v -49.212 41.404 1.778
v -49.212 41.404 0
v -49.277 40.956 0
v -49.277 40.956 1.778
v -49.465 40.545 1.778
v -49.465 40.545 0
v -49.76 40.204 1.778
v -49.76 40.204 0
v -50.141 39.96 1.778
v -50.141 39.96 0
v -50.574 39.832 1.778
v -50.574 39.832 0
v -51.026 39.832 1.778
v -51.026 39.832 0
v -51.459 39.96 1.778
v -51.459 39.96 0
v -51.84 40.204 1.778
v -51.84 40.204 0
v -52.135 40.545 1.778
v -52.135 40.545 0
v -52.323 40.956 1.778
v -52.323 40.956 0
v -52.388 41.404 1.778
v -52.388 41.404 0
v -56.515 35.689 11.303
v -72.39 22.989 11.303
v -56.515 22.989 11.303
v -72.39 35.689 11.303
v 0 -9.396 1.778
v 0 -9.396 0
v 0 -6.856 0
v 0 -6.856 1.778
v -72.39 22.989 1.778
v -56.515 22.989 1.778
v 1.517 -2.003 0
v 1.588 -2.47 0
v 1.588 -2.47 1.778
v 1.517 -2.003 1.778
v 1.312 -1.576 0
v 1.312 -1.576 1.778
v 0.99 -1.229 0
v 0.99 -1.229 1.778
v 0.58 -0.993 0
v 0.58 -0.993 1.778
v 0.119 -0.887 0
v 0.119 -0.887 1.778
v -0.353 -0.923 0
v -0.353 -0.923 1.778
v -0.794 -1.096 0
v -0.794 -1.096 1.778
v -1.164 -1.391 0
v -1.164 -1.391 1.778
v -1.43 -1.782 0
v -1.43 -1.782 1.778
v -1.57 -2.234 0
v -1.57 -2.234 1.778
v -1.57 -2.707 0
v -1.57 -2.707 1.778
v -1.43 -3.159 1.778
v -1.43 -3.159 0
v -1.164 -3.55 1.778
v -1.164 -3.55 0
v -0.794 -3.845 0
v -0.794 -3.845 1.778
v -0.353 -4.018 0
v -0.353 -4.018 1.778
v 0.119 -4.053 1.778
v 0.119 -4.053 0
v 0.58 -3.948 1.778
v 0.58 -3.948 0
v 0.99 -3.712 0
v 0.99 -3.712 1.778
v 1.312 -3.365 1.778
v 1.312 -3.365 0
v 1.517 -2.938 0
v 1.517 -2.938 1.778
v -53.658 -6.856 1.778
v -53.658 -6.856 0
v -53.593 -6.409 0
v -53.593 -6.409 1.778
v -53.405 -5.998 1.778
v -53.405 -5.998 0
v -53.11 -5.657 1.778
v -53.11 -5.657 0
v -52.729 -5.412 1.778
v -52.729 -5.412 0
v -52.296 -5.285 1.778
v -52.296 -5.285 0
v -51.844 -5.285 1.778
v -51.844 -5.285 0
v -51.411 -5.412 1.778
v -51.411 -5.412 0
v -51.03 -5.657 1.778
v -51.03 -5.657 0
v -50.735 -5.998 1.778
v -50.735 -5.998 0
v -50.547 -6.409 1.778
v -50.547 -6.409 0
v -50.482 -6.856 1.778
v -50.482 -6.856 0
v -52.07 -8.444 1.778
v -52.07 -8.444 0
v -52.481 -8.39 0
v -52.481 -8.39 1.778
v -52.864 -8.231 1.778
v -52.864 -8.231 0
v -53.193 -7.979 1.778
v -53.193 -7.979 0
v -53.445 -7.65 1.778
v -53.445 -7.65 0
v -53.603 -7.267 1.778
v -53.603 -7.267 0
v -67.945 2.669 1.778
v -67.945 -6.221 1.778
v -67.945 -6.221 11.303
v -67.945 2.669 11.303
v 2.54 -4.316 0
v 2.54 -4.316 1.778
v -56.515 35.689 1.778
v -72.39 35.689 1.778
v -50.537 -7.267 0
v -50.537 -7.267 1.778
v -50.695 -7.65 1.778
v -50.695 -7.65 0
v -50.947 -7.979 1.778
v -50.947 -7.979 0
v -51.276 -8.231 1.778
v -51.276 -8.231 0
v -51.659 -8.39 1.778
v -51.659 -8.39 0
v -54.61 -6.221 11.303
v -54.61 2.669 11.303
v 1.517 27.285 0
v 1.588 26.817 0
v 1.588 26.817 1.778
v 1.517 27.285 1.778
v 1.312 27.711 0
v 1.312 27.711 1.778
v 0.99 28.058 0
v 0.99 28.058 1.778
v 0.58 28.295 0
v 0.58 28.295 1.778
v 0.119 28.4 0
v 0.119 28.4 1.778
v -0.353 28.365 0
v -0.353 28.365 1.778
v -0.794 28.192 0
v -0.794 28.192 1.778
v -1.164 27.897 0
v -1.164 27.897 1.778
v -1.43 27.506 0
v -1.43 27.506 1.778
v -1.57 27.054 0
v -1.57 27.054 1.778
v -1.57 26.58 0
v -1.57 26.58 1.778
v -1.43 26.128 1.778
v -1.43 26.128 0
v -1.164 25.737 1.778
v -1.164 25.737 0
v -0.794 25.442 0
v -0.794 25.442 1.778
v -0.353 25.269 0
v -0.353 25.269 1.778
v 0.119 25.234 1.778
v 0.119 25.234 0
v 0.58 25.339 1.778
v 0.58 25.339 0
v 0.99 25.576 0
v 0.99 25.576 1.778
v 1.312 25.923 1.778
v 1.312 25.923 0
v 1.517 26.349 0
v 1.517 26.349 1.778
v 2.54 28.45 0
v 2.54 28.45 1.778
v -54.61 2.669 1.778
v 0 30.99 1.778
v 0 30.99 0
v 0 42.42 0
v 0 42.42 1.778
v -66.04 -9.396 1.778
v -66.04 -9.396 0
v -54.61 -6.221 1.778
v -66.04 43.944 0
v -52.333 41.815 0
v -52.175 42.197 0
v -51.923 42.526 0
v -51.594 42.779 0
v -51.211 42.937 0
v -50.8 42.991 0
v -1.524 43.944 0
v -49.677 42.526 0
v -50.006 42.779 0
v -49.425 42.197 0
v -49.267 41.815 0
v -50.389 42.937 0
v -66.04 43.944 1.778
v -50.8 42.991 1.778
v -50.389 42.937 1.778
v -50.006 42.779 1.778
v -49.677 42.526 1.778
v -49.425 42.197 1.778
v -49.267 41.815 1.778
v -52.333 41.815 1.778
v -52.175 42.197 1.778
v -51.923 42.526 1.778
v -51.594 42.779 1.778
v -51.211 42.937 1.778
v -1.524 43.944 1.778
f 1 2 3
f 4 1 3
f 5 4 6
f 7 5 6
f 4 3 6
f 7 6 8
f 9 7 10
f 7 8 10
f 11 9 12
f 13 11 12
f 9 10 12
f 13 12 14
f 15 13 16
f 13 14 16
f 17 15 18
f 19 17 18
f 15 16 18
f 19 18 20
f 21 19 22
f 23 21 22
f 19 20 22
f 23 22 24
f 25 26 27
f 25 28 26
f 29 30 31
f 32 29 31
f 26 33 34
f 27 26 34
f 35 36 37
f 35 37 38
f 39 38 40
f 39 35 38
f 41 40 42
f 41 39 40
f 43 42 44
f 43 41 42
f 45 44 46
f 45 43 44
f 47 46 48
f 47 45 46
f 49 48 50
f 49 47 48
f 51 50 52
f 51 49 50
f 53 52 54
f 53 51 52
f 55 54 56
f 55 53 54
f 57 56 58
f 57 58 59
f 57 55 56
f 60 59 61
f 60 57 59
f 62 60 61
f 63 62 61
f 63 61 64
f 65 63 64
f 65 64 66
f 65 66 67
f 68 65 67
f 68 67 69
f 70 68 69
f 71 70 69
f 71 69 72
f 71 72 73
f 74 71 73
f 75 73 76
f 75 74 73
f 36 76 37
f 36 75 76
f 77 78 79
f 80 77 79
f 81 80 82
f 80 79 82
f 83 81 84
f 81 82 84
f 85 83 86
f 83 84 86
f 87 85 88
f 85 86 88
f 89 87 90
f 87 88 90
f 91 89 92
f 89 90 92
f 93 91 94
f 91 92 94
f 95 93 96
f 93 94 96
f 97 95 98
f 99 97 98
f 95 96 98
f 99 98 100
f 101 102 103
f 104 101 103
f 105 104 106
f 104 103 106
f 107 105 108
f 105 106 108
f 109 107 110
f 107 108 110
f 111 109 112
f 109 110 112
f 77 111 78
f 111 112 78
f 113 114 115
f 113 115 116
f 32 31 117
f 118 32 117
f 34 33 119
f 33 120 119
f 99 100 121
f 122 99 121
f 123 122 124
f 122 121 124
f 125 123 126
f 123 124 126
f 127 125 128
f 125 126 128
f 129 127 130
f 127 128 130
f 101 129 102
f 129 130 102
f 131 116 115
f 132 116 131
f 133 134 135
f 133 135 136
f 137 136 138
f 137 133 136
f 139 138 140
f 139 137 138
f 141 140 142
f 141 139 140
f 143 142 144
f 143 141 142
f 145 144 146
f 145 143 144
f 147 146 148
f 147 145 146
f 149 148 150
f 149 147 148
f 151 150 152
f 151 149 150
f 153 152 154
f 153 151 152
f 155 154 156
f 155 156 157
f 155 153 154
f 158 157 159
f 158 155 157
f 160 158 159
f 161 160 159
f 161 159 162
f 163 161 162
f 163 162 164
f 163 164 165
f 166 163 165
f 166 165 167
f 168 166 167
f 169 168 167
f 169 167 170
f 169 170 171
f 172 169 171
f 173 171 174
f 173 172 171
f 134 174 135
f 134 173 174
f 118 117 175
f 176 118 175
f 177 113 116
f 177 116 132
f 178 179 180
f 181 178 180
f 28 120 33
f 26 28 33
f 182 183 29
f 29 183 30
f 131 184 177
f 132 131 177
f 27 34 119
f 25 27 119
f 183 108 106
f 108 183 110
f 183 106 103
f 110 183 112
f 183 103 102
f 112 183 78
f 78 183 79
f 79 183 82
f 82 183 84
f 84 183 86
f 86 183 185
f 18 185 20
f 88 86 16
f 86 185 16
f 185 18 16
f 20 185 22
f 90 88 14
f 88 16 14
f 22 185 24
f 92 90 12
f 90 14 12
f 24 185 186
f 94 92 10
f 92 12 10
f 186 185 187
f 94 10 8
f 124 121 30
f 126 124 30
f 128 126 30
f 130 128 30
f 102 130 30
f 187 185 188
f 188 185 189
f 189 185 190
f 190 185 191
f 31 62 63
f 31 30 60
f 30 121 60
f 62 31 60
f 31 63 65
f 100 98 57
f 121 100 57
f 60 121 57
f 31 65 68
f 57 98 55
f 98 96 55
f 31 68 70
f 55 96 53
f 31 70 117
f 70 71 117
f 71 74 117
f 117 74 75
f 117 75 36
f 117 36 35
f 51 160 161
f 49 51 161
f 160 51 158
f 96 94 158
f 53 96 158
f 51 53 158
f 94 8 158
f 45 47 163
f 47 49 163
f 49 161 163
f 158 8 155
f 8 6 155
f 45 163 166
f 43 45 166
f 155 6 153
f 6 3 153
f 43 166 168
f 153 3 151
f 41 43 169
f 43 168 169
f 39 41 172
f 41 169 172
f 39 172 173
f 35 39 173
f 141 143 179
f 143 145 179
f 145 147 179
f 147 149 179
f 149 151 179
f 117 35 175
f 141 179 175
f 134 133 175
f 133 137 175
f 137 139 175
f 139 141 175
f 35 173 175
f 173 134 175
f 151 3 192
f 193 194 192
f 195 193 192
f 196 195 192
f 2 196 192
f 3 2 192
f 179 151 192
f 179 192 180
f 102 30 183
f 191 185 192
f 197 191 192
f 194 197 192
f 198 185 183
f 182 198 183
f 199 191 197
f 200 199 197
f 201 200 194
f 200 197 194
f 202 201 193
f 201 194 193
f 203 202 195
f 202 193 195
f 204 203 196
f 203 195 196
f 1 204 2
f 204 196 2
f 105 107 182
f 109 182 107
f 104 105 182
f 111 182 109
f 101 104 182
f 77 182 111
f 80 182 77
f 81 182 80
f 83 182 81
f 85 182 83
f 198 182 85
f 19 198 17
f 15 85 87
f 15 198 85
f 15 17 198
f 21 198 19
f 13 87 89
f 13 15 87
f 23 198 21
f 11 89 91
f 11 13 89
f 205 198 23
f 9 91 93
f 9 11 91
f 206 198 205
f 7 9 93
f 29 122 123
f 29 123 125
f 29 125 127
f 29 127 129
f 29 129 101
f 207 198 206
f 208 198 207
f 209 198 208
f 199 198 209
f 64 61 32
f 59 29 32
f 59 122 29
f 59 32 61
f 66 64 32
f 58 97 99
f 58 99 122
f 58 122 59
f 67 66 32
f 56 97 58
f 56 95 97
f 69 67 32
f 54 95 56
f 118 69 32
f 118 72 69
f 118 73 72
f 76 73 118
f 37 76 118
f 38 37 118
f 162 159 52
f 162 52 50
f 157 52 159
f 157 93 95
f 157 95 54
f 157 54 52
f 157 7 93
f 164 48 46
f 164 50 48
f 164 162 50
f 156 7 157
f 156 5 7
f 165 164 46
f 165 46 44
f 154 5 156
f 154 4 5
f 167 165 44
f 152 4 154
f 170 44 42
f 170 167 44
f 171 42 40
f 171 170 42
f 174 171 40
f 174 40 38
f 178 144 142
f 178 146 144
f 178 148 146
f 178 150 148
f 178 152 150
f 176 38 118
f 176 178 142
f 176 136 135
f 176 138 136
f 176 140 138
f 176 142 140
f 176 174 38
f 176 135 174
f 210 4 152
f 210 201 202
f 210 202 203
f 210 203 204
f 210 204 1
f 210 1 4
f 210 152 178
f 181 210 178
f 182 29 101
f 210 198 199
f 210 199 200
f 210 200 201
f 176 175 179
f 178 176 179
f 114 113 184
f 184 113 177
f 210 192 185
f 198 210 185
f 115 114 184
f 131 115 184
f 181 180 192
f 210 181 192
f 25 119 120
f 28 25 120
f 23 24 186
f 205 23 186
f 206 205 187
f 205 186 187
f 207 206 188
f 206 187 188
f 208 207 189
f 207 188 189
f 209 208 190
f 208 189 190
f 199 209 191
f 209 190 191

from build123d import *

# Parameters (mm, degrees)
F0_R     = 1.5875
F1_DEPTH = 1.778
F2_W     = 13.335
F2_H     = 8.89
F3_DEPTH = 9.525


with BuildPart() as f1:
    # F0 (on Top) → F1 (new body)
    with BuildSketch(Plane.XY):
        with BuildLine():
            Line((-50.8, 43.943732), (-66.04, 43.943732))
            Line((-66.04, 43.943732), (-66.04, 41.403732))
            Line((-66.04, 41.403732), (-52.3875, 41.403732))
            ThreePointArc((-52.3875, 41.403732), (-51.922532, 42.526264), (-50.8, 42.991232))
            Line((-50.8, 42.991232), (-50.8, 43.943732))
        make_face()
        with BuildLine():
            Line((-52.3875, 41.403732), (-66.04, 41.403732))
            Line((-66.04, 41.403732), (-66.04, -6.856268))
            Line((-66.04, -6.856268), (-53.6575, -6.856268))
            ThreePointArc((-53.6575, -6.856268), (-52.07, -5.268768), (-50.4825, -6.856268))
            ThreePointArc((-50.4825, -6.856268), (-50.947468, -7.9788), (-52.07, -8.443768))
            Line((-52.07, -8.443768), (-52.07, -9.396268))
            Line((-52.07, -9.396268), (0, -9.396268))
            Line((0, -9.396268), (0, -6.856268))
            Line((0, -6.856268), (2.54, -4.316268))
            Line((2.54, -4.316268), (2.54, 28.449732))
            Line((2.54, 28.449732), (0, 30.989732))
            Line((0, 30.989732), (0, 42.419732))
            Line((0, 42.419732), (-1.524, 43.943732))
            Line((-1.524, 43.943732), (-50.8, 43.943732))
            Line((-50.8, 43.943732), (-50.8, 42.991232))
            ThreePointArc((-50.8, 42.991232), (-49.677468, 42.526264), (-49.2125, 41.403732))
            ThreePointArc((-49.2125, 41.403732), (-50.8, 39.816232), (-52.3875, 41.403732))
        make_face()
        with Locations((0, -2.470437)):
            Circle(F0_R, mode=Mode.SUBTRACT)
        with Locations((0, 26.817046)):
            Circle(F0_R, mode=Mode.SUBTRACT)
        with BuildLine():
            Line((-53.6575, -6.856268), (-66.04, -6.856268))
            Line((-66.04, -6.856268), (-66.04, -9.396268))
            Line((-66.04, -9.396268), (-52.07, -9.396268))
            Line((-52.07, -9.396268), (-52.07, -8.443768))
            ThreePointArc((-52.07, -8.443768), (-53.192532, -7.9788), (-53.6575, -6.856268))
        make_face()
    extrude(amount=F1_DEPTH)


with BuildPart() as f3:
    # F2 (on face) → F3 (new body)
    with BuildSketch(Plane.XY.offset(1.778)):
        with Locations((-61.2775, -1.776268)):
            Rectangle(F2_W, F2_H)
        Polygon((-72.39, 22.988732), (-66.04, 22.988732), (-56.515, 22.988732), (-56.515, 35.688732), (-72.39, 35.688732), align=None)
    extrude(amount=F3_DEPTH)


solid = Compound([f1.part, f3.part])
